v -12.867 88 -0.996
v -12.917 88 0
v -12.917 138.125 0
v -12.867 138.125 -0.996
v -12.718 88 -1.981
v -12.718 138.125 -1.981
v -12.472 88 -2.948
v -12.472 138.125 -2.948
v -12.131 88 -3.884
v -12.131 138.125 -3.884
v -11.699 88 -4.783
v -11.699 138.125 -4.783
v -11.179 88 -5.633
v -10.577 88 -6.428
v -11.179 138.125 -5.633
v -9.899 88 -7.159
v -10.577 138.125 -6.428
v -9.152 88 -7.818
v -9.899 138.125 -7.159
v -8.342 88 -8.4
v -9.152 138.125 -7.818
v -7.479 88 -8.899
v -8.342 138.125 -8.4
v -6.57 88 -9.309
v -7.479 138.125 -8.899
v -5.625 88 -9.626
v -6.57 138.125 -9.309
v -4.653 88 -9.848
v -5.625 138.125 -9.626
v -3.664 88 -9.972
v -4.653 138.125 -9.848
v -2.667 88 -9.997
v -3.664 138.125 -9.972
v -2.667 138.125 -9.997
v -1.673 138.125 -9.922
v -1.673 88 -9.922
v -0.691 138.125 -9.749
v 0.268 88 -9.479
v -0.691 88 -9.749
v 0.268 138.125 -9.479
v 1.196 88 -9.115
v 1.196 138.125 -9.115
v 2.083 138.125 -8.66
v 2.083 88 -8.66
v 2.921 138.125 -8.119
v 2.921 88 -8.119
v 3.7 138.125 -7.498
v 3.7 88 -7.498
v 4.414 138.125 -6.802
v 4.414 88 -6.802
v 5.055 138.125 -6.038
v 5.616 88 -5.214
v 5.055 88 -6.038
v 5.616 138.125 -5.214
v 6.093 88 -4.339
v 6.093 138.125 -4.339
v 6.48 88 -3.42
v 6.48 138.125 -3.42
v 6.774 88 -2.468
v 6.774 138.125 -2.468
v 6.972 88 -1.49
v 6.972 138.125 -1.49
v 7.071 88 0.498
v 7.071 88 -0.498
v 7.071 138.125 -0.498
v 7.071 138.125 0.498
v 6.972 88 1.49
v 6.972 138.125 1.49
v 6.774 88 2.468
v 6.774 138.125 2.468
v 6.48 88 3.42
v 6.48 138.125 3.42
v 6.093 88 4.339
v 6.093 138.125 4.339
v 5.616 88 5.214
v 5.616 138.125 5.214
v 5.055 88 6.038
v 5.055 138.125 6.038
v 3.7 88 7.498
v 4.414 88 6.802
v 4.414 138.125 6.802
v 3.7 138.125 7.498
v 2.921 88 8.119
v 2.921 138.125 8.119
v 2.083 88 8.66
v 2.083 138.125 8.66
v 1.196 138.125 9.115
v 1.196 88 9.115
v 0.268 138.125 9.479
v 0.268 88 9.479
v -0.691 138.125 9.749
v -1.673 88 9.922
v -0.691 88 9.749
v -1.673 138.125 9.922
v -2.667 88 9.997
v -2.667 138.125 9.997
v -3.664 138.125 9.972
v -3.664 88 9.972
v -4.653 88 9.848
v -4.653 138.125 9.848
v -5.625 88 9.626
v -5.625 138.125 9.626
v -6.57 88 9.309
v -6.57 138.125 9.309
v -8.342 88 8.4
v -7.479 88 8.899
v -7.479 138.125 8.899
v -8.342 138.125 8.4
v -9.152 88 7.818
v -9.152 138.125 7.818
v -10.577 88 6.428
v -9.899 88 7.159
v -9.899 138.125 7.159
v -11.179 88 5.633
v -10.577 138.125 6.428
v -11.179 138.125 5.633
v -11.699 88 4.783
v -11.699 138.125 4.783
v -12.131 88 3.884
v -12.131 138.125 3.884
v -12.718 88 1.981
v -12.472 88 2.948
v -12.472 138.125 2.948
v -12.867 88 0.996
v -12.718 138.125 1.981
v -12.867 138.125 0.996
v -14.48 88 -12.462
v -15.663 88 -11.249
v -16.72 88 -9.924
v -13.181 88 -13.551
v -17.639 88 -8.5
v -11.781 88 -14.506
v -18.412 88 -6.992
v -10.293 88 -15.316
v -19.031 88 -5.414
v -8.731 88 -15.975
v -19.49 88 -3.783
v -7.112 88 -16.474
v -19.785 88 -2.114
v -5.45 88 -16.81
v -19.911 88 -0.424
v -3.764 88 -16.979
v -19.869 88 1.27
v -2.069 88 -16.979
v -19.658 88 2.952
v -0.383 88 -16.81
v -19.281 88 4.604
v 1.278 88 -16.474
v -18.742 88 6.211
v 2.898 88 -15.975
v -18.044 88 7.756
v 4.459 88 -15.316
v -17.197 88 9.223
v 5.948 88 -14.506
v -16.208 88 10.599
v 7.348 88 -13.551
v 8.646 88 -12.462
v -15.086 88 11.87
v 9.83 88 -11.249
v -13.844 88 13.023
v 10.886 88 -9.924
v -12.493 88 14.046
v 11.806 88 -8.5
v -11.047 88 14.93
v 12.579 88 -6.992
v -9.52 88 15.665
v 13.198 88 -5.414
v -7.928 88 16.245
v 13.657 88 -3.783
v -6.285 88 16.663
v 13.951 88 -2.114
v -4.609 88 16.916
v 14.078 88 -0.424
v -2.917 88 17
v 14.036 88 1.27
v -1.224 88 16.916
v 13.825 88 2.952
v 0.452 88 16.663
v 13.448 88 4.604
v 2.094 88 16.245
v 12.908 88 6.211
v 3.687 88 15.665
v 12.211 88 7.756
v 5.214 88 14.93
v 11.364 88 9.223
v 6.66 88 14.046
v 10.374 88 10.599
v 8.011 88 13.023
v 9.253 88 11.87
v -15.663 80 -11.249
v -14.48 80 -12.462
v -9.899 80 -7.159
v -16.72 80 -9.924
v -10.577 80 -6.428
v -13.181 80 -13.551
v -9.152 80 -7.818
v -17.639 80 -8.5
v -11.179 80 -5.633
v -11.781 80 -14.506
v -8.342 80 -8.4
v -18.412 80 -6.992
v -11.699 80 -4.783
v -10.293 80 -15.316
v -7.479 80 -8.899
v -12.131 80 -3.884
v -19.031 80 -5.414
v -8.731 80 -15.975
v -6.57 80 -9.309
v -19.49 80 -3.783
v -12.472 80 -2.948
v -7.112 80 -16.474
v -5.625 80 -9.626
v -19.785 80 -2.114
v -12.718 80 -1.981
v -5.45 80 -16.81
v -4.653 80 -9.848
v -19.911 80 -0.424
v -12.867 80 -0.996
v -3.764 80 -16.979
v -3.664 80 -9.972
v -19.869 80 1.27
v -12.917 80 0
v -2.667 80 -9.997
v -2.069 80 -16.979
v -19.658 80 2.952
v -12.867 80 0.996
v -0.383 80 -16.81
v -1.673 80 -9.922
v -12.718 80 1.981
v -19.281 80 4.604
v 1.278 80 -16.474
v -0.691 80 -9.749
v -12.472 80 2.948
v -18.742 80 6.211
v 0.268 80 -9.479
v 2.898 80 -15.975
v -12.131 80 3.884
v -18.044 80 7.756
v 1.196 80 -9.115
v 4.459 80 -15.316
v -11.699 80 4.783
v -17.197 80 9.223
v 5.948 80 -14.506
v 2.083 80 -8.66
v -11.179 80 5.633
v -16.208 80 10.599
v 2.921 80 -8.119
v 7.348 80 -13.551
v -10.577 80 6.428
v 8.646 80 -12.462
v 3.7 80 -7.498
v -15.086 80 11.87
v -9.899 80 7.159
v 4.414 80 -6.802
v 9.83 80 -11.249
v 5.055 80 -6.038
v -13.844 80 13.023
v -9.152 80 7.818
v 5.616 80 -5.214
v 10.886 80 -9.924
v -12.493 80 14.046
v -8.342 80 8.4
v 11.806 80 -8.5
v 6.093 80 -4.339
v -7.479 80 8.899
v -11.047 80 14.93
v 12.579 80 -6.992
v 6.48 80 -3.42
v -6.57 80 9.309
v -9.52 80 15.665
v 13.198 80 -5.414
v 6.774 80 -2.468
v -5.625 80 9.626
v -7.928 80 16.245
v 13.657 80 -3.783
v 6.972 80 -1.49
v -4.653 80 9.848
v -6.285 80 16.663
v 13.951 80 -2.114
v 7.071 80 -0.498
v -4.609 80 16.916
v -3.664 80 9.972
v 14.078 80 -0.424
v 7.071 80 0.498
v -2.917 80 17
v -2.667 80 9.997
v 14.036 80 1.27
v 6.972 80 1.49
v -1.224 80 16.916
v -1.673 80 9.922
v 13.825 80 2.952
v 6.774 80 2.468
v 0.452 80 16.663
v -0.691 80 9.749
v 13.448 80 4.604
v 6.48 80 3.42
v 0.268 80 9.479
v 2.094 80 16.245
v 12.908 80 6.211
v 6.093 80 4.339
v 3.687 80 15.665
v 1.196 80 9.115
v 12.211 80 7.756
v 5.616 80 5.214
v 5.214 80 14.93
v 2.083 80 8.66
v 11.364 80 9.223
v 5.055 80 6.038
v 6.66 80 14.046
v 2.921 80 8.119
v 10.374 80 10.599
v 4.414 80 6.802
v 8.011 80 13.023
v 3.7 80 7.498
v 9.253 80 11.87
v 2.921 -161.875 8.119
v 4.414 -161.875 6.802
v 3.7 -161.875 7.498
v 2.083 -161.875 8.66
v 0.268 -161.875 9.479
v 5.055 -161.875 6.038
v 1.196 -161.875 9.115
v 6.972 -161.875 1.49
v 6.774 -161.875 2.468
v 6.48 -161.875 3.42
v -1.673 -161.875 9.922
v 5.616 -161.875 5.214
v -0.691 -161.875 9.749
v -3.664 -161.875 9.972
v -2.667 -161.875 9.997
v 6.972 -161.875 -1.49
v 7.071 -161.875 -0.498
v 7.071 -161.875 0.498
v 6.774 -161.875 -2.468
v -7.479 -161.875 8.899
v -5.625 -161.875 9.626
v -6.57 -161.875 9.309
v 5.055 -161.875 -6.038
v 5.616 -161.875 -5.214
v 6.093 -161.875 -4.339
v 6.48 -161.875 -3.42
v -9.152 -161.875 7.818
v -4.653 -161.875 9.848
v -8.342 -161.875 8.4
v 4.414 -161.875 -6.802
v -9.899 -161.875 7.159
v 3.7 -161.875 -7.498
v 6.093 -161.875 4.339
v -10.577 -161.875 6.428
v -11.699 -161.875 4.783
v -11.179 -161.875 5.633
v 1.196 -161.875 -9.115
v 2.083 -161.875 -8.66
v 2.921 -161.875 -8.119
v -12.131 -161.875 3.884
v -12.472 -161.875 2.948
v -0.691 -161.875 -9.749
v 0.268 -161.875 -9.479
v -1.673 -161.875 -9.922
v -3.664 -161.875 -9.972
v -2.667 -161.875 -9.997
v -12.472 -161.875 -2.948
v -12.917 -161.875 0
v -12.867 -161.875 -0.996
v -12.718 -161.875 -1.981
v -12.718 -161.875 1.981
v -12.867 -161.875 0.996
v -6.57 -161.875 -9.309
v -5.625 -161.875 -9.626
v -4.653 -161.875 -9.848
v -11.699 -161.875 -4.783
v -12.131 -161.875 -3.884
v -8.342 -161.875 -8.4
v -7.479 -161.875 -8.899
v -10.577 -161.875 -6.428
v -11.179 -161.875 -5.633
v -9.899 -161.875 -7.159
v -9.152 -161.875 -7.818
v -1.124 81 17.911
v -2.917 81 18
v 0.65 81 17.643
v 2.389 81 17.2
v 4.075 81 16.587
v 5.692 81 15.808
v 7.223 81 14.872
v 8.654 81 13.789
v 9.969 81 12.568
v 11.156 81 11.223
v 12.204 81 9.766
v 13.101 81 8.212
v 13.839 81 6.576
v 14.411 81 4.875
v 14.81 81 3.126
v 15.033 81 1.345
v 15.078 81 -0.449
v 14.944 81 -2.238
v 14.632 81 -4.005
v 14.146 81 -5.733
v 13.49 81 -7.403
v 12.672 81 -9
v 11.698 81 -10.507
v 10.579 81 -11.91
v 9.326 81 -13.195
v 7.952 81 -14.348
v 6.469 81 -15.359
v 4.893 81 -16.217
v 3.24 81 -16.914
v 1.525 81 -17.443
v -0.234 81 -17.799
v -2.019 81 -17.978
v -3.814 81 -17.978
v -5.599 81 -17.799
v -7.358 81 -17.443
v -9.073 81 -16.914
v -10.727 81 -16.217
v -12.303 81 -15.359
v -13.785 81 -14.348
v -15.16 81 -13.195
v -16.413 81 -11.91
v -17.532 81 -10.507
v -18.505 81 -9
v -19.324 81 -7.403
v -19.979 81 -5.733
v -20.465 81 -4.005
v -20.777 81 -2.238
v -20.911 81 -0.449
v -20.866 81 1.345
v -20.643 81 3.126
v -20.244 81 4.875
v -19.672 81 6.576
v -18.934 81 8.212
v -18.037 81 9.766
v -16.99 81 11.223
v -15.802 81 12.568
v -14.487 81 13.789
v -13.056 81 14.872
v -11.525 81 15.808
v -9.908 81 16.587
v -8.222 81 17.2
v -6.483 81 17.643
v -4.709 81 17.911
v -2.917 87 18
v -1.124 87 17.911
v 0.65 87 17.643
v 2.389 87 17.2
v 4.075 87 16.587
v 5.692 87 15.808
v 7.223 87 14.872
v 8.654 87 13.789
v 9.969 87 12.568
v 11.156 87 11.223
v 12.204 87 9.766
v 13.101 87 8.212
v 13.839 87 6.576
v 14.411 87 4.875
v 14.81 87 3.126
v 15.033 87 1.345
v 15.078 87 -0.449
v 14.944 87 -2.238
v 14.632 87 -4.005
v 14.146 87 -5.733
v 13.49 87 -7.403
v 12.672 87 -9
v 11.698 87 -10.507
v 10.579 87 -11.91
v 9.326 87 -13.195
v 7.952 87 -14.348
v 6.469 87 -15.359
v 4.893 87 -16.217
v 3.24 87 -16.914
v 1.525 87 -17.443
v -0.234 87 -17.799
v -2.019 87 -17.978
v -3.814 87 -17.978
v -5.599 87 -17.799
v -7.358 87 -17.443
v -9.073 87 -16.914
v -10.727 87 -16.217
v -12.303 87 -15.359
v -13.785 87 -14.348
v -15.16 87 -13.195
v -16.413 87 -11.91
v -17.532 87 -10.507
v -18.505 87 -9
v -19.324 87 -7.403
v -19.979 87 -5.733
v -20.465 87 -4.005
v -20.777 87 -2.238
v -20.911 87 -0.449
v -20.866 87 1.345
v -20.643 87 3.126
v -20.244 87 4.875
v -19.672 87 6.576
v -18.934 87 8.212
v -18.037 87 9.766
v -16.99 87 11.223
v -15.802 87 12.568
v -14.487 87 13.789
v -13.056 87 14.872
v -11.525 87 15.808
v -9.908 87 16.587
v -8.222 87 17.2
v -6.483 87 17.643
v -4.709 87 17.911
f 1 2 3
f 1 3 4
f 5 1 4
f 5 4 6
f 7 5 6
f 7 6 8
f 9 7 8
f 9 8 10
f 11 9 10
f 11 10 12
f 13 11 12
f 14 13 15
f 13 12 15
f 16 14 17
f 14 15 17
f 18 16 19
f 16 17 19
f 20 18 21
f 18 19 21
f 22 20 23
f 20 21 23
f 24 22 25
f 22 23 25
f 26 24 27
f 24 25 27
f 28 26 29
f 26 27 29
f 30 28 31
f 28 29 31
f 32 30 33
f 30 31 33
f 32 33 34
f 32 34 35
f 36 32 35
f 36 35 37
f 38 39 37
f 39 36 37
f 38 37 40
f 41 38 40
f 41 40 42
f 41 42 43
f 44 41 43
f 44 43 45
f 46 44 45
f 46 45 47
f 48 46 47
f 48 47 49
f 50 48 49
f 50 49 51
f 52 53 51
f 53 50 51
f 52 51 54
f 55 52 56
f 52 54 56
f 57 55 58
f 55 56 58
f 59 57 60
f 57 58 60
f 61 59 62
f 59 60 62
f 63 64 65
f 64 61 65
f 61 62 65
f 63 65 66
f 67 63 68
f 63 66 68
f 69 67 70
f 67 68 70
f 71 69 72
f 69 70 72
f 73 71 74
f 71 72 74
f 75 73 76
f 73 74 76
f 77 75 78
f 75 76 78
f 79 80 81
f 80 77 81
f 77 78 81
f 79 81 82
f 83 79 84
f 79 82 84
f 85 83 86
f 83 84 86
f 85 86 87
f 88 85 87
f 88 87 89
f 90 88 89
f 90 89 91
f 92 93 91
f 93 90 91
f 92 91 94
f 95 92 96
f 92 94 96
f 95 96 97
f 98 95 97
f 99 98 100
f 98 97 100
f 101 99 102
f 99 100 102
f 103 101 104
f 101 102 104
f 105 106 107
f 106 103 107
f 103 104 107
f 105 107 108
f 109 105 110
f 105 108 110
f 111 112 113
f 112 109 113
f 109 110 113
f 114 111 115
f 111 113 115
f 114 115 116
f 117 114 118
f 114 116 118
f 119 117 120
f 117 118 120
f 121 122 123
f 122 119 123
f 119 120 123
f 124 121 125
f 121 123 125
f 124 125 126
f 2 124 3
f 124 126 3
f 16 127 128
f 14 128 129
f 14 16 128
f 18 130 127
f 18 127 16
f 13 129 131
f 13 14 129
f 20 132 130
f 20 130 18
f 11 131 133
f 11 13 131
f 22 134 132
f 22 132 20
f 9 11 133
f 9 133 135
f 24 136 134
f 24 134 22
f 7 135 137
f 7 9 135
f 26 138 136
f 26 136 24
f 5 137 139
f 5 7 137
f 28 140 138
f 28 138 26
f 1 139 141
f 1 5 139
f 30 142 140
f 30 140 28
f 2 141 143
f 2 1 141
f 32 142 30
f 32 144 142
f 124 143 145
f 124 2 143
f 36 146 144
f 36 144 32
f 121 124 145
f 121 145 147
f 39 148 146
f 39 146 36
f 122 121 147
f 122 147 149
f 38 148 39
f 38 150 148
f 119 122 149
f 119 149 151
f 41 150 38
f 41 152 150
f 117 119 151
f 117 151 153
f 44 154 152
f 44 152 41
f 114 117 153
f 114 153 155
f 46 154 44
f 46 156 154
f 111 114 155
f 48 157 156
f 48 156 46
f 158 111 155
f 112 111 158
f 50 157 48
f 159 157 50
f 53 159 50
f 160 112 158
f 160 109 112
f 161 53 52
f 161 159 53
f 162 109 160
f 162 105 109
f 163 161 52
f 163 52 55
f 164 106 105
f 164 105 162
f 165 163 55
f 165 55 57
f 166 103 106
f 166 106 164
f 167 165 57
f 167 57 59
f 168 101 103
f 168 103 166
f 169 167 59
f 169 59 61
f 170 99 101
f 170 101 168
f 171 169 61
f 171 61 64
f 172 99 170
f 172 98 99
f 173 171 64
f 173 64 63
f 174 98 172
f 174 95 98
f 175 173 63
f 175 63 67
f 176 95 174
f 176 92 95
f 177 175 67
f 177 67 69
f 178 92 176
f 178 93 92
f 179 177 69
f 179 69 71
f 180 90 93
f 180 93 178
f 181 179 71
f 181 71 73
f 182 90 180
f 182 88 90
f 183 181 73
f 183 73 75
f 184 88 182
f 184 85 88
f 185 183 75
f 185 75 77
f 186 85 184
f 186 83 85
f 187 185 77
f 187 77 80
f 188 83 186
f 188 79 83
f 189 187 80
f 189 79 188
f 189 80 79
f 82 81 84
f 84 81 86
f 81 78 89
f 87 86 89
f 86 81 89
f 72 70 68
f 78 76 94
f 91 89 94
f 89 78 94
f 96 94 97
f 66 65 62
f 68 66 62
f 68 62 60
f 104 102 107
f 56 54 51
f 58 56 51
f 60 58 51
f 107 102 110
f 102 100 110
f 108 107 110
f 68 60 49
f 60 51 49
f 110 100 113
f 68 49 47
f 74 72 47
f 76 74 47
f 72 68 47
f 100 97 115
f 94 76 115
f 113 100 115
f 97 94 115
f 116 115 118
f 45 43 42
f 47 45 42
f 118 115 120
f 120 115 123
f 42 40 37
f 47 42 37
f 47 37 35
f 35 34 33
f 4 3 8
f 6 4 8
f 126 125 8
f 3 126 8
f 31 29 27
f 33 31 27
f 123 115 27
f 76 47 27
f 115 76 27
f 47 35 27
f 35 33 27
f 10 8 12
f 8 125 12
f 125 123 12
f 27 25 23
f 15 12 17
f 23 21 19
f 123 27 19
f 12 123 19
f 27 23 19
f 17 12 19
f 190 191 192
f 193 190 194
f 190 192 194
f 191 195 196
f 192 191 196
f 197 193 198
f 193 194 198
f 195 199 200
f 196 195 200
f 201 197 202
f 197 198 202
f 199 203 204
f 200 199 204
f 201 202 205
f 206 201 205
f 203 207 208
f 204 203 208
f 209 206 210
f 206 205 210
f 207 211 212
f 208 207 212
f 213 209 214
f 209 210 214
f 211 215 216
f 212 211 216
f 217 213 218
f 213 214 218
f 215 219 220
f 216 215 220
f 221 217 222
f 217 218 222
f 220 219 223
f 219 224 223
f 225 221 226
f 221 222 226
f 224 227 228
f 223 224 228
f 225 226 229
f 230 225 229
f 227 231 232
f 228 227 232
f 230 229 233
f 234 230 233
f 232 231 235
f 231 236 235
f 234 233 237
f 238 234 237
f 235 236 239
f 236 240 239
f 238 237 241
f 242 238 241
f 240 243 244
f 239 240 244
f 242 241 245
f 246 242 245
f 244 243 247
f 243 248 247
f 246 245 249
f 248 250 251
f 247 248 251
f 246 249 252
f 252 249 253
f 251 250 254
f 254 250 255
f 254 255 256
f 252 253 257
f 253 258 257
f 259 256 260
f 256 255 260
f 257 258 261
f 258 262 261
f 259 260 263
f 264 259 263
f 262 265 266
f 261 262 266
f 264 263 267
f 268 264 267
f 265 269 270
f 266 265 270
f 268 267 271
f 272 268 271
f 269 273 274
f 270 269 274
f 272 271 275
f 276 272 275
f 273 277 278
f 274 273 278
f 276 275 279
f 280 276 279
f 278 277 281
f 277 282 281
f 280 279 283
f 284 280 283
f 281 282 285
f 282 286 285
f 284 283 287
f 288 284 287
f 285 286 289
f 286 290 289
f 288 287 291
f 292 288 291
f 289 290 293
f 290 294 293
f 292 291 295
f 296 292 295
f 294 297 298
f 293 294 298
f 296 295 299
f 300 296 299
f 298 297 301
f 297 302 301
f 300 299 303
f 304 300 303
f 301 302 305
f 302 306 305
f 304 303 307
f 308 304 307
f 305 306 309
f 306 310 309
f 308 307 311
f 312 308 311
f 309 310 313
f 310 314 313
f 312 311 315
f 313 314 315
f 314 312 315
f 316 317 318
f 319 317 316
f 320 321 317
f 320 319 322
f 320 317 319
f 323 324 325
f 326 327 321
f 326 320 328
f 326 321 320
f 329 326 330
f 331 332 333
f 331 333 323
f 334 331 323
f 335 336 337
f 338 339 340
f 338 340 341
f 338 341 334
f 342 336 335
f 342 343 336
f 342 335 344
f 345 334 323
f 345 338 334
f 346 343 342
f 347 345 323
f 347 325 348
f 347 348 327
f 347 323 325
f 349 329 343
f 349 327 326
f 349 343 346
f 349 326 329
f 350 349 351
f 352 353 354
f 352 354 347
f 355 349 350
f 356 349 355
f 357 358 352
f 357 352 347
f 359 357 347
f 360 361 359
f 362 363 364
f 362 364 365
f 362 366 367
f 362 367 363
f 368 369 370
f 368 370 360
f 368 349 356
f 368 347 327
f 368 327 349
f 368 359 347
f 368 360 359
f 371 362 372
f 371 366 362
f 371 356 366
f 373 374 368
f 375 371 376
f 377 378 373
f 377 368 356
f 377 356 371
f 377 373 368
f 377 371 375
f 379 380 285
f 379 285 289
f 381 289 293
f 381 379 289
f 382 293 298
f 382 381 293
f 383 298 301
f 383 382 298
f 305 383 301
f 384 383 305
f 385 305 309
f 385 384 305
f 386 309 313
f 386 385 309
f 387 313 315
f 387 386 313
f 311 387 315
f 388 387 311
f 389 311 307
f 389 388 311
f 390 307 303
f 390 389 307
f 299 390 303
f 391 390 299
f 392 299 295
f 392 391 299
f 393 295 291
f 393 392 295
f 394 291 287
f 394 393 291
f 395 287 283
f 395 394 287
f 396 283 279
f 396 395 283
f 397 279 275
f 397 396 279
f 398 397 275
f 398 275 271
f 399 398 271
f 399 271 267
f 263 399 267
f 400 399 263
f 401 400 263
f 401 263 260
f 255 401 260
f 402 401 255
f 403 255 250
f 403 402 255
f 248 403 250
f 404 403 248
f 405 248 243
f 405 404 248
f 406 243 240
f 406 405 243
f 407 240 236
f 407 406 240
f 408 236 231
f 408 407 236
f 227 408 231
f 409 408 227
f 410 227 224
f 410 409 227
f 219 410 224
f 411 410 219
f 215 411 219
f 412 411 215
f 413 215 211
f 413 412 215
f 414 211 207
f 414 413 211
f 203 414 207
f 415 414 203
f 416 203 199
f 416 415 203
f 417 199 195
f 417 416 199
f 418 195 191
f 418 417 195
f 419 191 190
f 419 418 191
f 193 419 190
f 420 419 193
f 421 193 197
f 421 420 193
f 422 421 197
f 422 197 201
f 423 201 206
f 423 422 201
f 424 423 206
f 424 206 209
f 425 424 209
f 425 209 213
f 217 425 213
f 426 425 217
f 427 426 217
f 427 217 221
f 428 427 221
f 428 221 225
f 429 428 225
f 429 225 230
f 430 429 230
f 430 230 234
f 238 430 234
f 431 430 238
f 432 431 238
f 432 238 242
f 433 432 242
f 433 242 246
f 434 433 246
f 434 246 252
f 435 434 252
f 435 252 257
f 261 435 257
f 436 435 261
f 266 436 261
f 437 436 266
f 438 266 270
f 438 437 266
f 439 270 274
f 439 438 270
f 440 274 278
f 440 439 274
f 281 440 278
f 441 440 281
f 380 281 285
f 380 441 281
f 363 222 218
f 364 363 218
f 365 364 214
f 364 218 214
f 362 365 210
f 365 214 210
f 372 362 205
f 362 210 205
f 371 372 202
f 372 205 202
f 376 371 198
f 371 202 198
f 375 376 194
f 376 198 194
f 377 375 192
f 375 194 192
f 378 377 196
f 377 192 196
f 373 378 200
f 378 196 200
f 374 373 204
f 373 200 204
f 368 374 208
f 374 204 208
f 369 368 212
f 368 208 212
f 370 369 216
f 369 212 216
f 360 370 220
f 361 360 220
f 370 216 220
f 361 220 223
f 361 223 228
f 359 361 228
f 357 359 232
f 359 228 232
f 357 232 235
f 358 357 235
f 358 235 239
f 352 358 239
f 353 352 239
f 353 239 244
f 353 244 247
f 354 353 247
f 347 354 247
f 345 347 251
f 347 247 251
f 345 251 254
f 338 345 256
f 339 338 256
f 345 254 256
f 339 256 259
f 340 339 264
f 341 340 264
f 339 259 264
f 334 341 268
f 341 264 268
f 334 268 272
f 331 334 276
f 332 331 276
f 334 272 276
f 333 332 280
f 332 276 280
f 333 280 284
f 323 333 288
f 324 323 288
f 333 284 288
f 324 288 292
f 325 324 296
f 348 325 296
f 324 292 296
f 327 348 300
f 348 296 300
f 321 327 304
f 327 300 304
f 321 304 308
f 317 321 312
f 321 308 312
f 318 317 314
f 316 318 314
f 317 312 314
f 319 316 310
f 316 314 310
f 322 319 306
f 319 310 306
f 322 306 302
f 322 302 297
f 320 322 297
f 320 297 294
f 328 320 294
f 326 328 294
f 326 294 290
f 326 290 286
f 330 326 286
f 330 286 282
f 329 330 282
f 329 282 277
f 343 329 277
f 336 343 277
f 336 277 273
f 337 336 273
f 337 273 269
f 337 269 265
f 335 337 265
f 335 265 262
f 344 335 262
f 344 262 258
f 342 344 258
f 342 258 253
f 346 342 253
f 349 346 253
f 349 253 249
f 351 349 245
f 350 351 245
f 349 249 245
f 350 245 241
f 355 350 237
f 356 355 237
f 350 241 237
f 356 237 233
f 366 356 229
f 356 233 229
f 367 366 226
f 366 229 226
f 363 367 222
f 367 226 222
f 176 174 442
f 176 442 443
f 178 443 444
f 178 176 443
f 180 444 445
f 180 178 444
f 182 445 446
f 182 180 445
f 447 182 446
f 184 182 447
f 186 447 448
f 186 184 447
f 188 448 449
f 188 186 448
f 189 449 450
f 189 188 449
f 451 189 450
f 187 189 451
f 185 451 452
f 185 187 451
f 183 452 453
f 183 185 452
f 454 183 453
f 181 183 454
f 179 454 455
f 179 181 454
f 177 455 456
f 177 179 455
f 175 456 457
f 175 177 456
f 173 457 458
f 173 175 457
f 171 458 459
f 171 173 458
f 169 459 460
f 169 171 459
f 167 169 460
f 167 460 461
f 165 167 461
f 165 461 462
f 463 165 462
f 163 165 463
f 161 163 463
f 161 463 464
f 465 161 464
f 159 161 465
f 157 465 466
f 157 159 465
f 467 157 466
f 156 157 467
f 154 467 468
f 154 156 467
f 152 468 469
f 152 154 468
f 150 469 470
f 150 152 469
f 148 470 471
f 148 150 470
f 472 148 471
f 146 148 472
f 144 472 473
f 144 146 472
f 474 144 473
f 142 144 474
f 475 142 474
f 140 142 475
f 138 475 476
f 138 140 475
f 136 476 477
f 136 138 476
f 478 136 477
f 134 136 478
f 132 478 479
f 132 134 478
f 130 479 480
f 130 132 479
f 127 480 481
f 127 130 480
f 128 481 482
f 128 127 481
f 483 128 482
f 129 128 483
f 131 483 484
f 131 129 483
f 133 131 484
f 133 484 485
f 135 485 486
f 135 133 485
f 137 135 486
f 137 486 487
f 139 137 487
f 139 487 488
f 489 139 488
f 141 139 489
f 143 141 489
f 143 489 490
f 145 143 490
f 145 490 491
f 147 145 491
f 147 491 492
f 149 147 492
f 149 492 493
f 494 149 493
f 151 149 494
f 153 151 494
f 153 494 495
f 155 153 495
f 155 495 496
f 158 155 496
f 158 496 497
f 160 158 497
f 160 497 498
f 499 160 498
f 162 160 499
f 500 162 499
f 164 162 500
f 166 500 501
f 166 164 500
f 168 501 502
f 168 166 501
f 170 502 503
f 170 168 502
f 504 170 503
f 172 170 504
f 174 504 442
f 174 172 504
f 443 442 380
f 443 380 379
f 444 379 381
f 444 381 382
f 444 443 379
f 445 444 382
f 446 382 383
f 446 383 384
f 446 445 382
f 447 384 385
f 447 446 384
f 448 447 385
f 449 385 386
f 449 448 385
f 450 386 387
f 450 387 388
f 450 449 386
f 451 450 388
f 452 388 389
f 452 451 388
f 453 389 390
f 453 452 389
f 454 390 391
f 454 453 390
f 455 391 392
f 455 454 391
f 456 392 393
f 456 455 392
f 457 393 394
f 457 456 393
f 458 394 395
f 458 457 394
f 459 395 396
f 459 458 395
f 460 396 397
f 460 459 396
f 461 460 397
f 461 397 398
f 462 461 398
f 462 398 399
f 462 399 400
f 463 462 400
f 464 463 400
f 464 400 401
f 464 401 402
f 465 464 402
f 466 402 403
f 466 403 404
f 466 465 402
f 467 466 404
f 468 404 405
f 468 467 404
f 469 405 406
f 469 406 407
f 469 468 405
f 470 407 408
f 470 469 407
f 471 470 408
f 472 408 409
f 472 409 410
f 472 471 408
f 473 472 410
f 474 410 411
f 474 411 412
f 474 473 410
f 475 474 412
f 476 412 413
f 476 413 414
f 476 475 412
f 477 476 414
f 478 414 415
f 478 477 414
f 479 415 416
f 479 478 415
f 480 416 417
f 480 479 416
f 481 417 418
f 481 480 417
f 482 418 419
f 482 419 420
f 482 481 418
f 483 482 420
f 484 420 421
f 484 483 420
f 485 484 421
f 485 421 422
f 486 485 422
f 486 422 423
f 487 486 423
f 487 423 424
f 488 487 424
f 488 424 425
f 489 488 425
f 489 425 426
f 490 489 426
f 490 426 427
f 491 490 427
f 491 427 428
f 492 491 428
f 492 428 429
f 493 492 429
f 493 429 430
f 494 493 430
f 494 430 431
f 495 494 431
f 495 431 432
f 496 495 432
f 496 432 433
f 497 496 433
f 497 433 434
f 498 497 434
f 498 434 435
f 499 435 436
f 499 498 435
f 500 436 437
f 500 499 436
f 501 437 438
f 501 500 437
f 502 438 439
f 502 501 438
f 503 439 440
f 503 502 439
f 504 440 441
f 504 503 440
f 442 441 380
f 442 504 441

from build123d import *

# Parameters (mm, degrees)
SKETCH1_W           = 10
SKETCH1_H           = 300
BOSS_EXTRUDE3_START = 8
SKETCH4_R           = 18
SKETCH4_R_2         = 10
BOSS_EXTRUDE3_DEPTH = 8
CHAMFER1_SIZE       = 1


with BuildPart() as part:
    # Sketch1 → Revolve1 (revolve)
    with BuildSketch(Plane.XY):
        with Locations((-7.916666667, -11.875)):
            Rectangle(SKETCH1_W, SKETCH1_H)
    revolve(axis=Axis((-2.916666667, 138.125, 0), (0, -1, 0)))

    # Sketch4 → Boss-Extrude3 (add)
    with BuildSketch(Plane(origin=(0, 80, 0), x_dir=(1, 0, 0), z_dir=(0, 1, 0)).offset(BOSS_EXTRUDE3_START)):
        with Locations(Location((-2.916666667, 0, 0), (0, 0, 270))):
            Circle(SKETCH4_R)
        with Locations(Location((-2.916666667, 0, 0), (0, 0, 180))):
            Circle(SKETCH4_R_2, mode=Mode.SUBTRACT)
    extrude(amount=-BOSS_EXTRUDE3_DEPTH)

    # Chamfer1
    chamfer1_edges = [part.edges().sort_by_distance(p)[0] for p in [
        (-2.916666667, 88, -18),
        (-2.916666667, 80, -18),
    ]]
    chamfer(chamfer1_edges, length=CHAMFER1_SIZE)


solid = part.part
